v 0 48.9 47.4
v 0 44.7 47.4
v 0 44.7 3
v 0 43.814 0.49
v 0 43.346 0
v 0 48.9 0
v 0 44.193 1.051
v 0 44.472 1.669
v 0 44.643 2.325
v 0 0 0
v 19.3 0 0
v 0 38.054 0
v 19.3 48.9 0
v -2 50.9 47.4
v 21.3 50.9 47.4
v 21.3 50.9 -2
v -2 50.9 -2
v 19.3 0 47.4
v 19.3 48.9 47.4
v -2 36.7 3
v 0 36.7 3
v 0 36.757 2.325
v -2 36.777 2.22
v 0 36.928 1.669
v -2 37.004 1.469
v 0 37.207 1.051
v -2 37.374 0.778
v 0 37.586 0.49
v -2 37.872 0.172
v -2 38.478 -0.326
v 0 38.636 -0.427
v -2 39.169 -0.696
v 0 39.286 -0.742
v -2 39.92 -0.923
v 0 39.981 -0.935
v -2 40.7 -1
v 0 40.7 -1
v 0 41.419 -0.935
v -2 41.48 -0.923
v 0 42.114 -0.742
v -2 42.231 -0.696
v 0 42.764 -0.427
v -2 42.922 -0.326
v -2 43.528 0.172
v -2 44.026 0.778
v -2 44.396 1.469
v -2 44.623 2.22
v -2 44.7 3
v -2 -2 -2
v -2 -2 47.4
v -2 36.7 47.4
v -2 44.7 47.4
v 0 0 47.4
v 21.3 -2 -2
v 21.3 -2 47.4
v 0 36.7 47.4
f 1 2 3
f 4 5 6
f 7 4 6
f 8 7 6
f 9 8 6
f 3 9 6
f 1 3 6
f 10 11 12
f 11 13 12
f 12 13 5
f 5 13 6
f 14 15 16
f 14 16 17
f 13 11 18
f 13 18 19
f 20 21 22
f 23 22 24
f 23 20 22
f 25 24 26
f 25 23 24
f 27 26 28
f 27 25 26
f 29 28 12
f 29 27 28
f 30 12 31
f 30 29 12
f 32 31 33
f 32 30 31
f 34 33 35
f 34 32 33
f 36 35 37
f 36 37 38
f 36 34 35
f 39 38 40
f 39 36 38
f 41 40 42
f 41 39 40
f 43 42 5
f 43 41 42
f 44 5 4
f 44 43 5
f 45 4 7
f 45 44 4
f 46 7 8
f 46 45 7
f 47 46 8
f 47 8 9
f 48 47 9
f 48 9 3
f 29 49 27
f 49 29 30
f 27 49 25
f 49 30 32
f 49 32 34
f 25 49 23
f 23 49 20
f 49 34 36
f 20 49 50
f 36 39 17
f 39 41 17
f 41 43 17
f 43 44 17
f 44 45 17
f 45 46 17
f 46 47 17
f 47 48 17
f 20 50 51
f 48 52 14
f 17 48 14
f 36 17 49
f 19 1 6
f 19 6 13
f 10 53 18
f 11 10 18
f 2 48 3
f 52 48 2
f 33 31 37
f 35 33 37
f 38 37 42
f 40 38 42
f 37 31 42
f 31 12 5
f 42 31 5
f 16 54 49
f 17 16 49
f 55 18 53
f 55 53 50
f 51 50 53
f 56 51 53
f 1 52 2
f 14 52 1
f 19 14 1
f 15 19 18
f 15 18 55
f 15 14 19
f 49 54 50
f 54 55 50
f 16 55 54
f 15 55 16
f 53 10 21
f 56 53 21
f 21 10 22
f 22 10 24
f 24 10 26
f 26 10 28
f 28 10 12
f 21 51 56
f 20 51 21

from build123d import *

# Parameters (mm, degrees)
SKETCH1_W           = 23.3
SKETCH1_H           = 52.9
SKETCH1_W_2         = 19.3
SKETCH1_H_2         = 48.9
BOSS_EXTRUDE1_DEPTH = 47.4
SKETCH2_W           = 23.3
SKETCH2_H           = 52.9
BOSS_EXTRUDE2_DEPTH = 2
CUT_EXTRUDE1_DEPTH  = 2


with BuildPart() as part:
    # Sketch1 → Boss-Extrude1 (new body)
    with BuildSketch(Plane.XY):
        with Locations((9.65, 24.45)):
            Rectangle(SKETCH1_W, SKETCH1_H)
        with Locations((9.65, 24.45)):
            Rectangle(SKETCH1_W_2, SKETCH1_H_2, mode=Mode.SUBTRACT)
    extrude(amount=BOSS_EXTRUDE1_DEPTH)

    # Sketch2 → Boss-Extrude2 (add)
    with BuildSketch(Plane(origin=(0, 0, 0), x_dir=(-1, 0, 0), z_dir=(0, 0, -1))):
        with Locations((-9.65, 24.45)):
            Rectangle(SKETCH2_W, SKETCH2_H)
    extrude(amount=BOSS_EXTRUDE2_DEPTH)

    # Sketch3 → Cut-Extrude1 (cut)
    with BuildSketch(Plane.ZY.offset(2)):
        with BuildLine():
            Line((3, 44.7), (47.4, 44.7))
            ThreePointArc((47.4, 44.7), (51.4, 40.7), (47.4, 36.7))
            Line((47.4, 36.7), (3, 36.7))
            ThreePointArc((3, 36.7), (-1, 40.7), (3, 44.7))
        make_face()
    extrude(amount=-CUT_EXTRUDE1_DEPTH, mode=Mode.SUBTRACT)


solid = part.part
